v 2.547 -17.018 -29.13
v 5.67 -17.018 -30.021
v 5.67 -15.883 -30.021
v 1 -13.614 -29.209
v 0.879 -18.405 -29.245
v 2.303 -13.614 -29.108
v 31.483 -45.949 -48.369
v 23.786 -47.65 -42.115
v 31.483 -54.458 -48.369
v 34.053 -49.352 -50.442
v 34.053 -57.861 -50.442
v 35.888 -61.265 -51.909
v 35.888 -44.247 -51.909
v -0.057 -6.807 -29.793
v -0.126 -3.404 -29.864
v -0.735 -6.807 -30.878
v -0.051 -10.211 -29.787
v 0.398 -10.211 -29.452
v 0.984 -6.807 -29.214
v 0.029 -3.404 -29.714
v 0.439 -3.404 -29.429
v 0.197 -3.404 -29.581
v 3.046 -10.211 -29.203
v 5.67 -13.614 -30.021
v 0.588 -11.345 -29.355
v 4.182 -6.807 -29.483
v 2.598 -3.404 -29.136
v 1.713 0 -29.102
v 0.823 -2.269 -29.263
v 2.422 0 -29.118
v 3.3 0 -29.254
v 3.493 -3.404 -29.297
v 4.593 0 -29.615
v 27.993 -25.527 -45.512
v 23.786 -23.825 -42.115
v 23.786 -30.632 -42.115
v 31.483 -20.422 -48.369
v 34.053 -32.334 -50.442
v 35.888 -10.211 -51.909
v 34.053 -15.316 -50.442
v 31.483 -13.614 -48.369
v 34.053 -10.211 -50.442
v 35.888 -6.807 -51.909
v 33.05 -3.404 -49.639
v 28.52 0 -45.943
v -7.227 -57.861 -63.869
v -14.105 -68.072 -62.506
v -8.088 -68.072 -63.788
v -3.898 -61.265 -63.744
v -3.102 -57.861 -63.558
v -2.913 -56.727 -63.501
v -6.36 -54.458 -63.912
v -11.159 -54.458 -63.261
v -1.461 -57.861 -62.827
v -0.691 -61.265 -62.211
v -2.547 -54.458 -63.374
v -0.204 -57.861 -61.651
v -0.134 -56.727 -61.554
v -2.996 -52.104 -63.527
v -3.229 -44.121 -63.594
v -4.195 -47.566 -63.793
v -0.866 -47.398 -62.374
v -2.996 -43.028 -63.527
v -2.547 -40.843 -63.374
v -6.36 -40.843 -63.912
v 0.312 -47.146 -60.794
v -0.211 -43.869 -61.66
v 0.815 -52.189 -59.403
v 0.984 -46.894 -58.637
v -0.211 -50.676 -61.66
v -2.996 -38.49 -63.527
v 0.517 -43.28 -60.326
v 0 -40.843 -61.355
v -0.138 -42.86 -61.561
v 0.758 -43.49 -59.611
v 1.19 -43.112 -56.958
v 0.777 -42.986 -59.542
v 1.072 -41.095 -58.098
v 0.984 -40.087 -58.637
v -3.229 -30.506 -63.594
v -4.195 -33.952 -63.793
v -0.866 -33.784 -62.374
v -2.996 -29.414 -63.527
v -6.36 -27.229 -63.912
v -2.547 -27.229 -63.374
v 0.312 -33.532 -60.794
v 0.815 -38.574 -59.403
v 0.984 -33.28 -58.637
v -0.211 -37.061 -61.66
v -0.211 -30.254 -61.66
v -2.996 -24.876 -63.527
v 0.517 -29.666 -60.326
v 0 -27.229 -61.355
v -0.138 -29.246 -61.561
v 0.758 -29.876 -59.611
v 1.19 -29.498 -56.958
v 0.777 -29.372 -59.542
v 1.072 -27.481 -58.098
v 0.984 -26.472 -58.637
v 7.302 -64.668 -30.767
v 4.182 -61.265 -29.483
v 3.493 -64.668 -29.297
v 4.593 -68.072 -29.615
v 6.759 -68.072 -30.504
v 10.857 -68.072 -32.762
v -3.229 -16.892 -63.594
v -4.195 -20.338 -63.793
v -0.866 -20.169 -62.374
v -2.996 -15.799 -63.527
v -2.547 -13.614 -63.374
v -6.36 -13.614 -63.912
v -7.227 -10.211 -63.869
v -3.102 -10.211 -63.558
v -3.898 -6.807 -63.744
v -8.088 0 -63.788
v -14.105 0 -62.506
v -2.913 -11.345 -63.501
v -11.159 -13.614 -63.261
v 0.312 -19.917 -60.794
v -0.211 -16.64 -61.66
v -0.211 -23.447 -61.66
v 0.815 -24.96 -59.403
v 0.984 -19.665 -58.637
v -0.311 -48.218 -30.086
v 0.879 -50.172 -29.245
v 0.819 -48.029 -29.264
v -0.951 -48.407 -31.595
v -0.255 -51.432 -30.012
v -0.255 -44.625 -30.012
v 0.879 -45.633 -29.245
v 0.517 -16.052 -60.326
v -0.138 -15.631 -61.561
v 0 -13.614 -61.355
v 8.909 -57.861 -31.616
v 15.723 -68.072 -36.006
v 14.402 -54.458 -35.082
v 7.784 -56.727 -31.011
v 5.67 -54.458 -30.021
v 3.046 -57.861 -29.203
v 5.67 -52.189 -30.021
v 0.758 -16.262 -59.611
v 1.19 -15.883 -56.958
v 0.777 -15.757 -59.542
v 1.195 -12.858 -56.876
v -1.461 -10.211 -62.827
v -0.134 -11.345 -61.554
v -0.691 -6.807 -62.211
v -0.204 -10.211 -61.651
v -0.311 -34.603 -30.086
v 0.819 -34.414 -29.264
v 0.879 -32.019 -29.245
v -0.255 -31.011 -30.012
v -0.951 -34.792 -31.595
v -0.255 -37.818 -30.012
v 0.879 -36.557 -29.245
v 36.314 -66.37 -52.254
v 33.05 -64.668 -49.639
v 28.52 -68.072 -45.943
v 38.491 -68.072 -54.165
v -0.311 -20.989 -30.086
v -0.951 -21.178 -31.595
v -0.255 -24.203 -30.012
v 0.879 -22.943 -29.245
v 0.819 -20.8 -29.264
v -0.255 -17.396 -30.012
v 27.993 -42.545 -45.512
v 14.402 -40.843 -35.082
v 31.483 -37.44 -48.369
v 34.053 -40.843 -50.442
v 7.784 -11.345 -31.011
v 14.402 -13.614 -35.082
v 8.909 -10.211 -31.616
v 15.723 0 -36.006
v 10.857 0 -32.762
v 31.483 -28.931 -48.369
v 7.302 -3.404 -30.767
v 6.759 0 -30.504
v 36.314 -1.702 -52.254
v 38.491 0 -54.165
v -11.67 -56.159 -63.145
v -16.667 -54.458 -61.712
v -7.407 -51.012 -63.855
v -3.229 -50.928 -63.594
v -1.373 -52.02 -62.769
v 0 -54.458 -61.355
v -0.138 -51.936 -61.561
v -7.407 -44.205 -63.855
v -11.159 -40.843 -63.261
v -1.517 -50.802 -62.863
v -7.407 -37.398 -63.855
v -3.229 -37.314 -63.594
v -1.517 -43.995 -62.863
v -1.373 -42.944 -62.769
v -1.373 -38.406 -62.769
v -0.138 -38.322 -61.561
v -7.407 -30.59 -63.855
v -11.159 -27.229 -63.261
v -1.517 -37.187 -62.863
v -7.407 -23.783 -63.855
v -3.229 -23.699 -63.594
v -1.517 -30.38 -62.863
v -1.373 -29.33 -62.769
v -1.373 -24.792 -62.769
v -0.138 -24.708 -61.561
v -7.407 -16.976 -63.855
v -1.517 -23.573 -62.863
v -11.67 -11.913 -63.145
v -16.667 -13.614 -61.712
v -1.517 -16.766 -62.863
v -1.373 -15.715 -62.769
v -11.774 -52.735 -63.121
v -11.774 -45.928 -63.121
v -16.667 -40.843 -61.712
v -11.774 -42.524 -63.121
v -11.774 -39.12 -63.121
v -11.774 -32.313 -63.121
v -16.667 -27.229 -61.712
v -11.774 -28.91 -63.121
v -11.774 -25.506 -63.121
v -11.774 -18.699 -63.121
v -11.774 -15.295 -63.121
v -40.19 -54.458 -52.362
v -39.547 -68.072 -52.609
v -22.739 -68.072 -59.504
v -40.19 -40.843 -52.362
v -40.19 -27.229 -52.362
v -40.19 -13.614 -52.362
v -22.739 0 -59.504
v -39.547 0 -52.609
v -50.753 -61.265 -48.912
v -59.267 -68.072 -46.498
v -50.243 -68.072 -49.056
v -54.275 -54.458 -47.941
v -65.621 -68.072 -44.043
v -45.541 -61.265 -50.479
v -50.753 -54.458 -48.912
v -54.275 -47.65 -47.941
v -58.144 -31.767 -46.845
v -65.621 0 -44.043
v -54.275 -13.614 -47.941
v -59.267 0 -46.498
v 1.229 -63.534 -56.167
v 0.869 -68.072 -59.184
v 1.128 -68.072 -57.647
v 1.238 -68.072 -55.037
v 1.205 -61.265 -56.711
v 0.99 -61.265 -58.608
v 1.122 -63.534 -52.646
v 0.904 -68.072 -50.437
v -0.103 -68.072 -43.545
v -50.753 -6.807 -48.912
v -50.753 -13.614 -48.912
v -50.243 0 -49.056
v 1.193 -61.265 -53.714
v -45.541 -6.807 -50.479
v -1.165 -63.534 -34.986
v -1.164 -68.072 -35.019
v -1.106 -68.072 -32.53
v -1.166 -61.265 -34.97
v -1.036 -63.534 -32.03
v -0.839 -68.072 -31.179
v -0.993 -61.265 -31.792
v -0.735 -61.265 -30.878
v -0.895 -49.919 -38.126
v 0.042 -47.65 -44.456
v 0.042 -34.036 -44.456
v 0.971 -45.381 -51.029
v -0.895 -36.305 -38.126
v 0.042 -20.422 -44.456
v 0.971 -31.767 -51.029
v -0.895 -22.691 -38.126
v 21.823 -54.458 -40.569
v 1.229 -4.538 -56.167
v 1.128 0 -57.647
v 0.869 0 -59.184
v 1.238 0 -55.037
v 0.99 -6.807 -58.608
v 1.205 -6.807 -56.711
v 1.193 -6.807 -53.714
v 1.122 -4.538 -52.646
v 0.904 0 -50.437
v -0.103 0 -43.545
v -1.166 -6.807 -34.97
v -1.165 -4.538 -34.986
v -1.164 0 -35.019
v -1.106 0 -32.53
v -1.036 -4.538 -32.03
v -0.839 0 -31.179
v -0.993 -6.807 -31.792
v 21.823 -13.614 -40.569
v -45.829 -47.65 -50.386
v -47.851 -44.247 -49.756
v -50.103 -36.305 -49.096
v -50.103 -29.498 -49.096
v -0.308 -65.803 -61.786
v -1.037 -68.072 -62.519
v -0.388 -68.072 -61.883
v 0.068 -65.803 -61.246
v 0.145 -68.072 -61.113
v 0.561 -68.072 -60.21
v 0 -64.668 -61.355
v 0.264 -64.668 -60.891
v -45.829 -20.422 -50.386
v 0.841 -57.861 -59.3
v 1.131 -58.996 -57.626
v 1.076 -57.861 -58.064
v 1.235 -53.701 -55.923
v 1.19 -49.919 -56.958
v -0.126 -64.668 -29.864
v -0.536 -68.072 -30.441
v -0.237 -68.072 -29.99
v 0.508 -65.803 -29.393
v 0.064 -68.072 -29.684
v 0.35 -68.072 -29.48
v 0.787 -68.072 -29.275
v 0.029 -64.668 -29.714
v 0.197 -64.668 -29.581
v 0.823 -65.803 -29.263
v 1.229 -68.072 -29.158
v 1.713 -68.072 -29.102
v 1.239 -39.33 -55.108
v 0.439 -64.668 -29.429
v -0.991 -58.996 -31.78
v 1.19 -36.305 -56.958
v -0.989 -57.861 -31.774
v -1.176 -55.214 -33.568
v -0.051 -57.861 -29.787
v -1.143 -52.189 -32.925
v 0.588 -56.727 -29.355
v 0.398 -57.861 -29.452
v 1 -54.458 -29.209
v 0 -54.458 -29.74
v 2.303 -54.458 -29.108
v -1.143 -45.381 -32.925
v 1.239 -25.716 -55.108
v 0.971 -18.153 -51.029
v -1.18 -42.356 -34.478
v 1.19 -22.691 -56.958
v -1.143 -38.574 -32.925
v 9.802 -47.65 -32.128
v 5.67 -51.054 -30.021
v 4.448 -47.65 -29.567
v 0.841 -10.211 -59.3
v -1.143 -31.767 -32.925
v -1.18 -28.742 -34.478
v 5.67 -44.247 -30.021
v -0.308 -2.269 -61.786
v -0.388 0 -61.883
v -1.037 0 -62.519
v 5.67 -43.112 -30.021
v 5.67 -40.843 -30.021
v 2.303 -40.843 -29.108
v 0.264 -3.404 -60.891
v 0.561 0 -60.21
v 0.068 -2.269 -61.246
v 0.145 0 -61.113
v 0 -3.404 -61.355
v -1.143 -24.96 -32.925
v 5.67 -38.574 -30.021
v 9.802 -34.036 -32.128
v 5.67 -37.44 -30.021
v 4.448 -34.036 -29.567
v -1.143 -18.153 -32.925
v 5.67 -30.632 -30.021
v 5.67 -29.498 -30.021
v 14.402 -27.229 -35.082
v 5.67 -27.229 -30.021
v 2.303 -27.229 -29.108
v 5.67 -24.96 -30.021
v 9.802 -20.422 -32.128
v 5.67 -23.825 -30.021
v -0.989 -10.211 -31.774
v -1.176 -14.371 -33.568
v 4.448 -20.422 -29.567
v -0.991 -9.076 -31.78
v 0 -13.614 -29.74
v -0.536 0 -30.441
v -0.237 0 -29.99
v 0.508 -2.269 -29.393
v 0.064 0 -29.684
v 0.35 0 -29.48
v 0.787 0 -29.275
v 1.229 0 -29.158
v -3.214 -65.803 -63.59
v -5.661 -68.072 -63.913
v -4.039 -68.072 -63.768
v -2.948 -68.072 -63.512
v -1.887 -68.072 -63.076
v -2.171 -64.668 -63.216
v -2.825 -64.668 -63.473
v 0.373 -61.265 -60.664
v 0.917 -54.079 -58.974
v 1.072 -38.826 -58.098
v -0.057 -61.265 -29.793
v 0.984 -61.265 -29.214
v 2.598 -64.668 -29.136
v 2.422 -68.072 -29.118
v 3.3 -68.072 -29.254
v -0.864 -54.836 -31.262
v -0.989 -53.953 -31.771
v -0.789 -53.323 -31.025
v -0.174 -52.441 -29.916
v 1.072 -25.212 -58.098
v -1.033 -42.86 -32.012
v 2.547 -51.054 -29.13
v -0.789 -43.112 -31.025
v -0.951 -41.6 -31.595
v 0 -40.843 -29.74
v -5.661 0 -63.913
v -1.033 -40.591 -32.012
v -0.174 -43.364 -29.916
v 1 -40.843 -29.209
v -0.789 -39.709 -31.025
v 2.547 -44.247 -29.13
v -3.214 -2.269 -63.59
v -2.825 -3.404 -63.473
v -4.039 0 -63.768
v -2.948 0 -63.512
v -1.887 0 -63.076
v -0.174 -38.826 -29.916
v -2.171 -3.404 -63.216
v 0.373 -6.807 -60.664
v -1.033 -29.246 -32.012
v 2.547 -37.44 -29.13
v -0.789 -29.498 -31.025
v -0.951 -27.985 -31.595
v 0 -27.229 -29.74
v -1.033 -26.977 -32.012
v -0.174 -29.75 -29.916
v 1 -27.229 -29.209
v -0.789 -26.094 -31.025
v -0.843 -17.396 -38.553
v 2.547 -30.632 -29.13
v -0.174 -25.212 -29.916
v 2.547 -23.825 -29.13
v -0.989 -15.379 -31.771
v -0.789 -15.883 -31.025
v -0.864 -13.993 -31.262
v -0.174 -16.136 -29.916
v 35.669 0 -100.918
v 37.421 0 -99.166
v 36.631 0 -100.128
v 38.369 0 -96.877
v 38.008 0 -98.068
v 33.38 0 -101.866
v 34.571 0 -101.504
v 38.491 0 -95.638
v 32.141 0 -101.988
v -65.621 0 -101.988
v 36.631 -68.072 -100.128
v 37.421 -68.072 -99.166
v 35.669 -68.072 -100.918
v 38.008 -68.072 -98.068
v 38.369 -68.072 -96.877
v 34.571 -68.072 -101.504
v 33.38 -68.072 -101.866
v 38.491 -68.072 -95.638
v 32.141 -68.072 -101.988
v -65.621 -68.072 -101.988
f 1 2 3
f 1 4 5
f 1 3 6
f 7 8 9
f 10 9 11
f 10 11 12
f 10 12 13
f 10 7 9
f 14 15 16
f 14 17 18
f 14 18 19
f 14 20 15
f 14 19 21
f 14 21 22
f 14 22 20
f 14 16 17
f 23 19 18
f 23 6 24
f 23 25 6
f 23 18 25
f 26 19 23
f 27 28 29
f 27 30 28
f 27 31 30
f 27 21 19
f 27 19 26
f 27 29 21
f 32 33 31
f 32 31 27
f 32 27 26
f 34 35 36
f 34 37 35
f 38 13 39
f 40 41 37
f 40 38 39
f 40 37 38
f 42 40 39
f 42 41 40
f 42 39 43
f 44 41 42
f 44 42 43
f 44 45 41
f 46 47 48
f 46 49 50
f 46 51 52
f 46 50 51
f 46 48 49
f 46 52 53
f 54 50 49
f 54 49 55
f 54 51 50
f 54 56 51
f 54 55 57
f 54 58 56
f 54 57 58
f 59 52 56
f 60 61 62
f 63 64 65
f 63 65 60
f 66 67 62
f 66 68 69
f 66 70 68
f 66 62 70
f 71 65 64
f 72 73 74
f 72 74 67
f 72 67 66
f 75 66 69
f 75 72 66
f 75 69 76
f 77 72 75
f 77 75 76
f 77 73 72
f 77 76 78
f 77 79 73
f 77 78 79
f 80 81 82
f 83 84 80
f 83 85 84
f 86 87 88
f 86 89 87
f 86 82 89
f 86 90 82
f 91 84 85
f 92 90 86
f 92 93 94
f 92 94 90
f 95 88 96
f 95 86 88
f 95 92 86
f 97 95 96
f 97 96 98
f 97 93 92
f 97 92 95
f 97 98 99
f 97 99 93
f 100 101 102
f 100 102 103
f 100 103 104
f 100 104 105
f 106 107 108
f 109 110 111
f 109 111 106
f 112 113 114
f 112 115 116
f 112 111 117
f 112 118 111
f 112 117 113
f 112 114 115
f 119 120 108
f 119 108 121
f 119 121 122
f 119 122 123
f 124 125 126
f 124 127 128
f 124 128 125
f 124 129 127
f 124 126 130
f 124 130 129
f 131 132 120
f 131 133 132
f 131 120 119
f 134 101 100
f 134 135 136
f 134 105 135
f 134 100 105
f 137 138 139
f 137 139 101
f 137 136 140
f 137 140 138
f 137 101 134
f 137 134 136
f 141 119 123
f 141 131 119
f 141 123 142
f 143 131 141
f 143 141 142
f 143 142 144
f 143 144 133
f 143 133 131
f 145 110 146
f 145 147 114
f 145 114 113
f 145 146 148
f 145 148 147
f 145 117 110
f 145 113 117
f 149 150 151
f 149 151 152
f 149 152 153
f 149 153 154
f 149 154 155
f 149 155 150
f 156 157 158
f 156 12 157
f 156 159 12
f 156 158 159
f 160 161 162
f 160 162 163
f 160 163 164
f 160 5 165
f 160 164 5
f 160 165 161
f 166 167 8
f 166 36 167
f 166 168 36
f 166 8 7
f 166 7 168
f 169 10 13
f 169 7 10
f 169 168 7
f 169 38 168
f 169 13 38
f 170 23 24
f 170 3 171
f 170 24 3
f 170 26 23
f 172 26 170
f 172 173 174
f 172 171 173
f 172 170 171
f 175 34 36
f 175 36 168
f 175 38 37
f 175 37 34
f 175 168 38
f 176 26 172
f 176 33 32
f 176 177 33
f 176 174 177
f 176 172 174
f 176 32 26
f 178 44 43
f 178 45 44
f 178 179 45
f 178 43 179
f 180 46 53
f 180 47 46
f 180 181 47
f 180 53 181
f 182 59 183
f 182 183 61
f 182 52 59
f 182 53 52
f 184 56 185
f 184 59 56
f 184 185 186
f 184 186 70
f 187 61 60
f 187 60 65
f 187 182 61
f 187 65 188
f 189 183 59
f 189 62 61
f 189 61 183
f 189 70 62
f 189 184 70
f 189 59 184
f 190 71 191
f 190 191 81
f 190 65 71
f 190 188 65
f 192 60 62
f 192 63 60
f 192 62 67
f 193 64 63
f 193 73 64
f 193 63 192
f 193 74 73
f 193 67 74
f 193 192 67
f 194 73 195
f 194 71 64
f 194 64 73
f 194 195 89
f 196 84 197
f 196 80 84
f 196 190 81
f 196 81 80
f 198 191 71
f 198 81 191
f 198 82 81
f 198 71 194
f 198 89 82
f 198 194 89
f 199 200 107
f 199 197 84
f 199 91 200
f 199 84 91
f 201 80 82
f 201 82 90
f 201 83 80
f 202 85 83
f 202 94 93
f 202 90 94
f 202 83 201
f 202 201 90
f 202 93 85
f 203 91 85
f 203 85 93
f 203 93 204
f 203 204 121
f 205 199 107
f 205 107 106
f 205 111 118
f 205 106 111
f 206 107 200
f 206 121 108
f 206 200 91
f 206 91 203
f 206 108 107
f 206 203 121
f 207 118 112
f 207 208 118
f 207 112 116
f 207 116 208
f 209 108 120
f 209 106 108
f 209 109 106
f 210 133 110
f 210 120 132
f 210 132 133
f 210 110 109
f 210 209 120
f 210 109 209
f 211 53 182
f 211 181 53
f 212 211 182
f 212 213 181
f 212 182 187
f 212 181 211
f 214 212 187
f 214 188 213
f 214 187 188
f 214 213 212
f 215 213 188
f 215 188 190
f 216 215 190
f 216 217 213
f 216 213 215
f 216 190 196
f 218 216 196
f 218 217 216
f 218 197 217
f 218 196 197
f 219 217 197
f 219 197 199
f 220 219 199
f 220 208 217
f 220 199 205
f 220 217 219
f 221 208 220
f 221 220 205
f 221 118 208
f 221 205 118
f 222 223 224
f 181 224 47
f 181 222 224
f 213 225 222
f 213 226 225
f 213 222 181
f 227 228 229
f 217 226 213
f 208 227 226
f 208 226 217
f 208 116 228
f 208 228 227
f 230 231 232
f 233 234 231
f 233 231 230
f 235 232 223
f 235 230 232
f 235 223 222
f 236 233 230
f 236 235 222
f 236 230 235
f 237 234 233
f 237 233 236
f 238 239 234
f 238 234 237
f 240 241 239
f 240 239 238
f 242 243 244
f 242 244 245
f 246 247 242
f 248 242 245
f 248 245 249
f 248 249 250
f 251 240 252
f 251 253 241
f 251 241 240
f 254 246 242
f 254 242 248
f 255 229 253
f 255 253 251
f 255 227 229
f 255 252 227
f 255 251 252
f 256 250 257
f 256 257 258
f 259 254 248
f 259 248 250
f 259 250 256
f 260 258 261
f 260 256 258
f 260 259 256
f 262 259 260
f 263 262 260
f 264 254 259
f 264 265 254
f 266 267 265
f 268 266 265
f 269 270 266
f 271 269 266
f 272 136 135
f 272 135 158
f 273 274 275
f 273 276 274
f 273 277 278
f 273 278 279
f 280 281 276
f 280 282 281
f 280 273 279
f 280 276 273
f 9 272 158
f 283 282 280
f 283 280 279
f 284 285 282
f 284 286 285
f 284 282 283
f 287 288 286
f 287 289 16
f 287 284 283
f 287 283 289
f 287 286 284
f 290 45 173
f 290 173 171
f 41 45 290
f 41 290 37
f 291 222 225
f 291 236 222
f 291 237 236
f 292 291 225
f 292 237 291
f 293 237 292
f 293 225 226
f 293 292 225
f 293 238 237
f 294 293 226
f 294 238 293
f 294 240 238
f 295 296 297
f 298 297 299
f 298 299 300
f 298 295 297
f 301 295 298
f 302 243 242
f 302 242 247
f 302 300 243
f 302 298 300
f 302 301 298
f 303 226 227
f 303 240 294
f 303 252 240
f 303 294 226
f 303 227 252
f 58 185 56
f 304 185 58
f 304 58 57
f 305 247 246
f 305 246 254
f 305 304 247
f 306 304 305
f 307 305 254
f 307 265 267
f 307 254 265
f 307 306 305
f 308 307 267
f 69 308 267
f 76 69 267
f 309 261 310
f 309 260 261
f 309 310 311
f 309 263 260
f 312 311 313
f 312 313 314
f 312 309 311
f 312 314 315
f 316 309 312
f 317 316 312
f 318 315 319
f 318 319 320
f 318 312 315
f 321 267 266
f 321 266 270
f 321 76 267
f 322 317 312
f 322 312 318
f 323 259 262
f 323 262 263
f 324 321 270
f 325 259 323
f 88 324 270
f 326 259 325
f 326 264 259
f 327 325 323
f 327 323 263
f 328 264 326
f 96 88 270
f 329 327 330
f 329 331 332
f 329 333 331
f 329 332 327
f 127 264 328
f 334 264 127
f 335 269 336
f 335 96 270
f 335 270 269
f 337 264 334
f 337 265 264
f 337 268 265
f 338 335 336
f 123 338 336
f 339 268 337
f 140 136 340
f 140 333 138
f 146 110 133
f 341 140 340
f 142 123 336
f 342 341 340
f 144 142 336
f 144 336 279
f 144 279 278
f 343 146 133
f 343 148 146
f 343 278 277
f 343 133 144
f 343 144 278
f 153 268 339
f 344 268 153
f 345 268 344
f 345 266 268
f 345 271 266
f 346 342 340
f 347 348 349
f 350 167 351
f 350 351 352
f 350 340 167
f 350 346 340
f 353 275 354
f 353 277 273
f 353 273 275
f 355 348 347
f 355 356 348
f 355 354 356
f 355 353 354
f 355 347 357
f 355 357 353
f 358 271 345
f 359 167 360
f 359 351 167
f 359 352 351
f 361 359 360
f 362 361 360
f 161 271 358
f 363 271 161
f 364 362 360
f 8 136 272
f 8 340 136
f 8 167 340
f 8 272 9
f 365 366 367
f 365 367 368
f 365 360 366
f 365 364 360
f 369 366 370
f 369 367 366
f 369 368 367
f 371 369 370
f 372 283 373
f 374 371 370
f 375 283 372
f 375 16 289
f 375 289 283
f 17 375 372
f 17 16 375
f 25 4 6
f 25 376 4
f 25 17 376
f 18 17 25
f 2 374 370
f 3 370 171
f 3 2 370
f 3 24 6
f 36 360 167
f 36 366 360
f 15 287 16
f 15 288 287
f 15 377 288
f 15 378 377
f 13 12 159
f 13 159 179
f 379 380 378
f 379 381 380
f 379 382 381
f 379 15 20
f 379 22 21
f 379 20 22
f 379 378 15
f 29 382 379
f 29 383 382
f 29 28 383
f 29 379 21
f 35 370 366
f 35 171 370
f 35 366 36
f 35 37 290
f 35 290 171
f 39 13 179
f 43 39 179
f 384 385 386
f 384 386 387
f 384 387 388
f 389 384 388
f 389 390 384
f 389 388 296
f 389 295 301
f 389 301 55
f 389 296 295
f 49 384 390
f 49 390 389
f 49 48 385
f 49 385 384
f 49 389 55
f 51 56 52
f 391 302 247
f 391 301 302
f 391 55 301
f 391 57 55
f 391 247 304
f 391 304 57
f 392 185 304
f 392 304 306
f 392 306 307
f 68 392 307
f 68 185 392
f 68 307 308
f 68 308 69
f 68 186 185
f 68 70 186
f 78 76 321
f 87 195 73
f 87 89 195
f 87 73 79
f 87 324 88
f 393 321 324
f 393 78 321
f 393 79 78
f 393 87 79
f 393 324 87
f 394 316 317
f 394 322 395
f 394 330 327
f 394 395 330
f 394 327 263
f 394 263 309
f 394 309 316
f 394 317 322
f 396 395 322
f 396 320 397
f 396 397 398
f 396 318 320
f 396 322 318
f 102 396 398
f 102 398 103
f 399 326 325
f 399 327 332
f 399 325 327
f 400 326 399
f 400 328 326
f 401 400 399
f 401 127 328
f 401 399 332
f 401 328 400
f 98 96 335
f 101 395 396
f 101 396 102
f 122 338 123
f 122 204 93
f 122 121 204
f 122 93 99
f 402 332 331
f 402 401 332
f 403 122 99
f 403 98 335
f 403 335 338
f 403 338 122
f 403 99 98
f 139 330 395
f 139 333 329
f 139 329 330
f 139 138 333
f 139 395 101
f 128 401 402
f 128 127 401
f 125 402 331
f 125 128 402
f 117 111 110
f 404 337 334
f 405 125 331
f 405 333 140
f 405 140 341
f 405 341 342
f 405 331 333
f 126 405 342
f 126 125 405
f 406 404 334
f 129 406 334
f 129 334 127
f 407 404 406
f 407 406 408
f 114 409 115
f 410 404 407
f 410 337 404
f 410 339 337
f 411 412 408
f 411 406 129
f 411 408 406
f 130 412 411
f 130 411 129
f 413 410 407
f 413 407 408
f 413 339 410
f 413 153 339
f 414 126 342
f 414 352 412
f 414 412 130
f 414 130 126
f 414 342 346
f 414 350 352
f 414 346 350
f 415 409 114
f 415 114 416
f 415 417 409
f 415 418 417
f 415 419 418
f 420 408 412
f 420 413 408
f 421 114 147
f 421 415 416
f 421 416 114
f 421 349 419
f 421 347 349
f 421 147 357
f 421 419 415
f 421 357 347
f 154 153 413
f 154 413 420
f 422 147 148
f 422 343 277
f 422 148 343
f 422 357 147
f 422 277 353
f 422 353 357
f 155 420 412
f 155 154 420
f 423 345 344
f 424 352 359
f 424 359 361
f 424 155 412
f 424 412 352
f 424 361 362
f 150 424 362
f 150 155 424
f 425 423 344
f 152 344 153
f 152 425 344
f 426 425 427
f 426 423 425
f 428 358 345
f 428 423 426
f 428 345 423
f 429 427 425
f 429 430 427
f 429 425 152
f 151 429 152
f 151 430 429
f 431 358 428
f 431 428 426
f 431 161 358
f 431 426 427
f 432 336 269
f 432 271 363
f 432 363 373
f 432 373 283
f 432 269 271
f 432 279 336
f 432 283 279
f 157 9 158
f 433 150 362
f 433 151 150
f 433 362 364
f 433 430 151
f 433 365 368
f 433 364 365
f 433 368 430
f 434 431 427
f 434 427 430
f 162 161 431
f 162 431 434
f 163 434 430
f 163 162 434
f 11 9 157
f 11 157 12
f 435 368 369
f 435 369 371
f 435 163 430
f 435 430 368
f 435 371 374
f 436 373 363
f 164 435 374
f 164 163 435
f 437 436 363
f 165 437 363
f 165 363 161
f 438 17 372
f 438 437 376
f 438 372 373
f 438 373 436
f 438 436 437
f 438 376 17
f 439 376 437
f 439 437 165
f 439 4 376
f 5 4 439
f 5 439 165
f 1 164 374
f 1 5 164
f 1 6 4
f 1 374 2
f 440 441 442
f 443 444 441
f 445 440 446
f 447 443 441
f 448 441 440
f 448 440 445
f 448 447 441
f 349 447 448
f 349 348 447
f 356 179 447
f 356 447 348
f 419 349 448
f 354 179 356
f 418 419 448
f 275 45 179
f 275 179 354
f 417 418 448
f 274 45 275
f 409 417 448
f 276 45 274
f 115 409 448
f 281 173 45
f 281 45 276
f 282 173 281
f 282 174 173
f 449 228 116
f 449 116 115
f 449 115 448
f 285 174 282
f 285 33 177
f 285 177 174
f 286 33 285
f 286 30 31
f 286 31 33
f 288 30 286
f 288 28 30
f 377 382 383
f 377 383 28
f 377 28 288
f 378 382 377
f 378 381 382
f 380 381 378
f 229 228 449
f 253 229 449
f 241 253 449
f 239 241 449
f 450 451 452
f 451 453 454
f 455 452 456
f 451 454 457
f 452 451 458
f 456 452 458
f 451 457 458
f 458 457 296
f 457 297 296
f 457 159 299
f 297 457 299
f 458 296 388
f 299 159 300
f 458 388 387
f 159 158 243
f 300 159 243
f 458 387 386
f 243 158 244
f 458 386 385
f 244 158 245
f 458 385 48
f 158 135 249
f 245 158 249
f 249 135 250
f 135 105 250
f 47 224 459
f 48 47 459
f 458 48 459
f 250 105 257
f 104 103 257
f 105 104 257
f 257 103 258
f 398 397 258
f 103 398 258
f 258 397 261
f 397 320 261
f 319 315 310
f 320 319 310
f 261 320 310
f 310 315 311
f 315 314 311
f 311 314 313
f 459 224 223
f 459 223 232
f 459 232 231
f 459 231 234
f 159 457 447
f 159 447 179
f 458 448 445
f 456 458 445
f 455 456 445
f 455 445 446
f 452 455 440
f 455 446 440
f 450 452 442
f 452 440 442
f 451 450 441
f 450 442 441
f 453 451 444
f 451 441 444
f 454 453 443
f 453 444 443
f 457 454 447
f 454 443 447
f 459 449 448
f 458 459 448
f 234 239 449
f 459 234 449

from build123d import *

# Parameters (mm, degrees)
F1_DEPTH = 68.072


with BuildPart() as f1:
    # F0 (on Front) → F1 (new body)
    with BuildSketch(Plane.XZ):
        with BuildLine():
            add(Edge.make_bspline(
                [(-65.6212195754, -44.043213129), (-57.990104171, -47.6410757652), (-43.3890529863, -48.5968405717), (13.837560673, -78.8551760709), (-13.178909407, -10.706002509), (32.8759400488, -49.8315061678), (36.8546978275, -52.5845302968), (38.49099949, -54.1647821665)],
                knots=[0, 0, 0, 0, 0.19688366, 0.4411461297, 0.6551595071, 0.8855157888, 1, 1, 1, 1], degree=3))
            Line((-65.6212195754, -44.043213129), (-65.6212195754, -101.9876971841))
            Line((-65.6212195754, -101.9876971841), (32.14099949, -101.9876971841))
            ThreePointArc((32.14099949, -101.9876971841), (36.6311275506, -100.1278252446), (38.49099949, -95.6376971841))
            Line((38.49099949, -95.6376971841), (38.49099949, -54.1647821665))
        make_face()
    extrude(amount=F1_DEPTH)


solid = f1.part
